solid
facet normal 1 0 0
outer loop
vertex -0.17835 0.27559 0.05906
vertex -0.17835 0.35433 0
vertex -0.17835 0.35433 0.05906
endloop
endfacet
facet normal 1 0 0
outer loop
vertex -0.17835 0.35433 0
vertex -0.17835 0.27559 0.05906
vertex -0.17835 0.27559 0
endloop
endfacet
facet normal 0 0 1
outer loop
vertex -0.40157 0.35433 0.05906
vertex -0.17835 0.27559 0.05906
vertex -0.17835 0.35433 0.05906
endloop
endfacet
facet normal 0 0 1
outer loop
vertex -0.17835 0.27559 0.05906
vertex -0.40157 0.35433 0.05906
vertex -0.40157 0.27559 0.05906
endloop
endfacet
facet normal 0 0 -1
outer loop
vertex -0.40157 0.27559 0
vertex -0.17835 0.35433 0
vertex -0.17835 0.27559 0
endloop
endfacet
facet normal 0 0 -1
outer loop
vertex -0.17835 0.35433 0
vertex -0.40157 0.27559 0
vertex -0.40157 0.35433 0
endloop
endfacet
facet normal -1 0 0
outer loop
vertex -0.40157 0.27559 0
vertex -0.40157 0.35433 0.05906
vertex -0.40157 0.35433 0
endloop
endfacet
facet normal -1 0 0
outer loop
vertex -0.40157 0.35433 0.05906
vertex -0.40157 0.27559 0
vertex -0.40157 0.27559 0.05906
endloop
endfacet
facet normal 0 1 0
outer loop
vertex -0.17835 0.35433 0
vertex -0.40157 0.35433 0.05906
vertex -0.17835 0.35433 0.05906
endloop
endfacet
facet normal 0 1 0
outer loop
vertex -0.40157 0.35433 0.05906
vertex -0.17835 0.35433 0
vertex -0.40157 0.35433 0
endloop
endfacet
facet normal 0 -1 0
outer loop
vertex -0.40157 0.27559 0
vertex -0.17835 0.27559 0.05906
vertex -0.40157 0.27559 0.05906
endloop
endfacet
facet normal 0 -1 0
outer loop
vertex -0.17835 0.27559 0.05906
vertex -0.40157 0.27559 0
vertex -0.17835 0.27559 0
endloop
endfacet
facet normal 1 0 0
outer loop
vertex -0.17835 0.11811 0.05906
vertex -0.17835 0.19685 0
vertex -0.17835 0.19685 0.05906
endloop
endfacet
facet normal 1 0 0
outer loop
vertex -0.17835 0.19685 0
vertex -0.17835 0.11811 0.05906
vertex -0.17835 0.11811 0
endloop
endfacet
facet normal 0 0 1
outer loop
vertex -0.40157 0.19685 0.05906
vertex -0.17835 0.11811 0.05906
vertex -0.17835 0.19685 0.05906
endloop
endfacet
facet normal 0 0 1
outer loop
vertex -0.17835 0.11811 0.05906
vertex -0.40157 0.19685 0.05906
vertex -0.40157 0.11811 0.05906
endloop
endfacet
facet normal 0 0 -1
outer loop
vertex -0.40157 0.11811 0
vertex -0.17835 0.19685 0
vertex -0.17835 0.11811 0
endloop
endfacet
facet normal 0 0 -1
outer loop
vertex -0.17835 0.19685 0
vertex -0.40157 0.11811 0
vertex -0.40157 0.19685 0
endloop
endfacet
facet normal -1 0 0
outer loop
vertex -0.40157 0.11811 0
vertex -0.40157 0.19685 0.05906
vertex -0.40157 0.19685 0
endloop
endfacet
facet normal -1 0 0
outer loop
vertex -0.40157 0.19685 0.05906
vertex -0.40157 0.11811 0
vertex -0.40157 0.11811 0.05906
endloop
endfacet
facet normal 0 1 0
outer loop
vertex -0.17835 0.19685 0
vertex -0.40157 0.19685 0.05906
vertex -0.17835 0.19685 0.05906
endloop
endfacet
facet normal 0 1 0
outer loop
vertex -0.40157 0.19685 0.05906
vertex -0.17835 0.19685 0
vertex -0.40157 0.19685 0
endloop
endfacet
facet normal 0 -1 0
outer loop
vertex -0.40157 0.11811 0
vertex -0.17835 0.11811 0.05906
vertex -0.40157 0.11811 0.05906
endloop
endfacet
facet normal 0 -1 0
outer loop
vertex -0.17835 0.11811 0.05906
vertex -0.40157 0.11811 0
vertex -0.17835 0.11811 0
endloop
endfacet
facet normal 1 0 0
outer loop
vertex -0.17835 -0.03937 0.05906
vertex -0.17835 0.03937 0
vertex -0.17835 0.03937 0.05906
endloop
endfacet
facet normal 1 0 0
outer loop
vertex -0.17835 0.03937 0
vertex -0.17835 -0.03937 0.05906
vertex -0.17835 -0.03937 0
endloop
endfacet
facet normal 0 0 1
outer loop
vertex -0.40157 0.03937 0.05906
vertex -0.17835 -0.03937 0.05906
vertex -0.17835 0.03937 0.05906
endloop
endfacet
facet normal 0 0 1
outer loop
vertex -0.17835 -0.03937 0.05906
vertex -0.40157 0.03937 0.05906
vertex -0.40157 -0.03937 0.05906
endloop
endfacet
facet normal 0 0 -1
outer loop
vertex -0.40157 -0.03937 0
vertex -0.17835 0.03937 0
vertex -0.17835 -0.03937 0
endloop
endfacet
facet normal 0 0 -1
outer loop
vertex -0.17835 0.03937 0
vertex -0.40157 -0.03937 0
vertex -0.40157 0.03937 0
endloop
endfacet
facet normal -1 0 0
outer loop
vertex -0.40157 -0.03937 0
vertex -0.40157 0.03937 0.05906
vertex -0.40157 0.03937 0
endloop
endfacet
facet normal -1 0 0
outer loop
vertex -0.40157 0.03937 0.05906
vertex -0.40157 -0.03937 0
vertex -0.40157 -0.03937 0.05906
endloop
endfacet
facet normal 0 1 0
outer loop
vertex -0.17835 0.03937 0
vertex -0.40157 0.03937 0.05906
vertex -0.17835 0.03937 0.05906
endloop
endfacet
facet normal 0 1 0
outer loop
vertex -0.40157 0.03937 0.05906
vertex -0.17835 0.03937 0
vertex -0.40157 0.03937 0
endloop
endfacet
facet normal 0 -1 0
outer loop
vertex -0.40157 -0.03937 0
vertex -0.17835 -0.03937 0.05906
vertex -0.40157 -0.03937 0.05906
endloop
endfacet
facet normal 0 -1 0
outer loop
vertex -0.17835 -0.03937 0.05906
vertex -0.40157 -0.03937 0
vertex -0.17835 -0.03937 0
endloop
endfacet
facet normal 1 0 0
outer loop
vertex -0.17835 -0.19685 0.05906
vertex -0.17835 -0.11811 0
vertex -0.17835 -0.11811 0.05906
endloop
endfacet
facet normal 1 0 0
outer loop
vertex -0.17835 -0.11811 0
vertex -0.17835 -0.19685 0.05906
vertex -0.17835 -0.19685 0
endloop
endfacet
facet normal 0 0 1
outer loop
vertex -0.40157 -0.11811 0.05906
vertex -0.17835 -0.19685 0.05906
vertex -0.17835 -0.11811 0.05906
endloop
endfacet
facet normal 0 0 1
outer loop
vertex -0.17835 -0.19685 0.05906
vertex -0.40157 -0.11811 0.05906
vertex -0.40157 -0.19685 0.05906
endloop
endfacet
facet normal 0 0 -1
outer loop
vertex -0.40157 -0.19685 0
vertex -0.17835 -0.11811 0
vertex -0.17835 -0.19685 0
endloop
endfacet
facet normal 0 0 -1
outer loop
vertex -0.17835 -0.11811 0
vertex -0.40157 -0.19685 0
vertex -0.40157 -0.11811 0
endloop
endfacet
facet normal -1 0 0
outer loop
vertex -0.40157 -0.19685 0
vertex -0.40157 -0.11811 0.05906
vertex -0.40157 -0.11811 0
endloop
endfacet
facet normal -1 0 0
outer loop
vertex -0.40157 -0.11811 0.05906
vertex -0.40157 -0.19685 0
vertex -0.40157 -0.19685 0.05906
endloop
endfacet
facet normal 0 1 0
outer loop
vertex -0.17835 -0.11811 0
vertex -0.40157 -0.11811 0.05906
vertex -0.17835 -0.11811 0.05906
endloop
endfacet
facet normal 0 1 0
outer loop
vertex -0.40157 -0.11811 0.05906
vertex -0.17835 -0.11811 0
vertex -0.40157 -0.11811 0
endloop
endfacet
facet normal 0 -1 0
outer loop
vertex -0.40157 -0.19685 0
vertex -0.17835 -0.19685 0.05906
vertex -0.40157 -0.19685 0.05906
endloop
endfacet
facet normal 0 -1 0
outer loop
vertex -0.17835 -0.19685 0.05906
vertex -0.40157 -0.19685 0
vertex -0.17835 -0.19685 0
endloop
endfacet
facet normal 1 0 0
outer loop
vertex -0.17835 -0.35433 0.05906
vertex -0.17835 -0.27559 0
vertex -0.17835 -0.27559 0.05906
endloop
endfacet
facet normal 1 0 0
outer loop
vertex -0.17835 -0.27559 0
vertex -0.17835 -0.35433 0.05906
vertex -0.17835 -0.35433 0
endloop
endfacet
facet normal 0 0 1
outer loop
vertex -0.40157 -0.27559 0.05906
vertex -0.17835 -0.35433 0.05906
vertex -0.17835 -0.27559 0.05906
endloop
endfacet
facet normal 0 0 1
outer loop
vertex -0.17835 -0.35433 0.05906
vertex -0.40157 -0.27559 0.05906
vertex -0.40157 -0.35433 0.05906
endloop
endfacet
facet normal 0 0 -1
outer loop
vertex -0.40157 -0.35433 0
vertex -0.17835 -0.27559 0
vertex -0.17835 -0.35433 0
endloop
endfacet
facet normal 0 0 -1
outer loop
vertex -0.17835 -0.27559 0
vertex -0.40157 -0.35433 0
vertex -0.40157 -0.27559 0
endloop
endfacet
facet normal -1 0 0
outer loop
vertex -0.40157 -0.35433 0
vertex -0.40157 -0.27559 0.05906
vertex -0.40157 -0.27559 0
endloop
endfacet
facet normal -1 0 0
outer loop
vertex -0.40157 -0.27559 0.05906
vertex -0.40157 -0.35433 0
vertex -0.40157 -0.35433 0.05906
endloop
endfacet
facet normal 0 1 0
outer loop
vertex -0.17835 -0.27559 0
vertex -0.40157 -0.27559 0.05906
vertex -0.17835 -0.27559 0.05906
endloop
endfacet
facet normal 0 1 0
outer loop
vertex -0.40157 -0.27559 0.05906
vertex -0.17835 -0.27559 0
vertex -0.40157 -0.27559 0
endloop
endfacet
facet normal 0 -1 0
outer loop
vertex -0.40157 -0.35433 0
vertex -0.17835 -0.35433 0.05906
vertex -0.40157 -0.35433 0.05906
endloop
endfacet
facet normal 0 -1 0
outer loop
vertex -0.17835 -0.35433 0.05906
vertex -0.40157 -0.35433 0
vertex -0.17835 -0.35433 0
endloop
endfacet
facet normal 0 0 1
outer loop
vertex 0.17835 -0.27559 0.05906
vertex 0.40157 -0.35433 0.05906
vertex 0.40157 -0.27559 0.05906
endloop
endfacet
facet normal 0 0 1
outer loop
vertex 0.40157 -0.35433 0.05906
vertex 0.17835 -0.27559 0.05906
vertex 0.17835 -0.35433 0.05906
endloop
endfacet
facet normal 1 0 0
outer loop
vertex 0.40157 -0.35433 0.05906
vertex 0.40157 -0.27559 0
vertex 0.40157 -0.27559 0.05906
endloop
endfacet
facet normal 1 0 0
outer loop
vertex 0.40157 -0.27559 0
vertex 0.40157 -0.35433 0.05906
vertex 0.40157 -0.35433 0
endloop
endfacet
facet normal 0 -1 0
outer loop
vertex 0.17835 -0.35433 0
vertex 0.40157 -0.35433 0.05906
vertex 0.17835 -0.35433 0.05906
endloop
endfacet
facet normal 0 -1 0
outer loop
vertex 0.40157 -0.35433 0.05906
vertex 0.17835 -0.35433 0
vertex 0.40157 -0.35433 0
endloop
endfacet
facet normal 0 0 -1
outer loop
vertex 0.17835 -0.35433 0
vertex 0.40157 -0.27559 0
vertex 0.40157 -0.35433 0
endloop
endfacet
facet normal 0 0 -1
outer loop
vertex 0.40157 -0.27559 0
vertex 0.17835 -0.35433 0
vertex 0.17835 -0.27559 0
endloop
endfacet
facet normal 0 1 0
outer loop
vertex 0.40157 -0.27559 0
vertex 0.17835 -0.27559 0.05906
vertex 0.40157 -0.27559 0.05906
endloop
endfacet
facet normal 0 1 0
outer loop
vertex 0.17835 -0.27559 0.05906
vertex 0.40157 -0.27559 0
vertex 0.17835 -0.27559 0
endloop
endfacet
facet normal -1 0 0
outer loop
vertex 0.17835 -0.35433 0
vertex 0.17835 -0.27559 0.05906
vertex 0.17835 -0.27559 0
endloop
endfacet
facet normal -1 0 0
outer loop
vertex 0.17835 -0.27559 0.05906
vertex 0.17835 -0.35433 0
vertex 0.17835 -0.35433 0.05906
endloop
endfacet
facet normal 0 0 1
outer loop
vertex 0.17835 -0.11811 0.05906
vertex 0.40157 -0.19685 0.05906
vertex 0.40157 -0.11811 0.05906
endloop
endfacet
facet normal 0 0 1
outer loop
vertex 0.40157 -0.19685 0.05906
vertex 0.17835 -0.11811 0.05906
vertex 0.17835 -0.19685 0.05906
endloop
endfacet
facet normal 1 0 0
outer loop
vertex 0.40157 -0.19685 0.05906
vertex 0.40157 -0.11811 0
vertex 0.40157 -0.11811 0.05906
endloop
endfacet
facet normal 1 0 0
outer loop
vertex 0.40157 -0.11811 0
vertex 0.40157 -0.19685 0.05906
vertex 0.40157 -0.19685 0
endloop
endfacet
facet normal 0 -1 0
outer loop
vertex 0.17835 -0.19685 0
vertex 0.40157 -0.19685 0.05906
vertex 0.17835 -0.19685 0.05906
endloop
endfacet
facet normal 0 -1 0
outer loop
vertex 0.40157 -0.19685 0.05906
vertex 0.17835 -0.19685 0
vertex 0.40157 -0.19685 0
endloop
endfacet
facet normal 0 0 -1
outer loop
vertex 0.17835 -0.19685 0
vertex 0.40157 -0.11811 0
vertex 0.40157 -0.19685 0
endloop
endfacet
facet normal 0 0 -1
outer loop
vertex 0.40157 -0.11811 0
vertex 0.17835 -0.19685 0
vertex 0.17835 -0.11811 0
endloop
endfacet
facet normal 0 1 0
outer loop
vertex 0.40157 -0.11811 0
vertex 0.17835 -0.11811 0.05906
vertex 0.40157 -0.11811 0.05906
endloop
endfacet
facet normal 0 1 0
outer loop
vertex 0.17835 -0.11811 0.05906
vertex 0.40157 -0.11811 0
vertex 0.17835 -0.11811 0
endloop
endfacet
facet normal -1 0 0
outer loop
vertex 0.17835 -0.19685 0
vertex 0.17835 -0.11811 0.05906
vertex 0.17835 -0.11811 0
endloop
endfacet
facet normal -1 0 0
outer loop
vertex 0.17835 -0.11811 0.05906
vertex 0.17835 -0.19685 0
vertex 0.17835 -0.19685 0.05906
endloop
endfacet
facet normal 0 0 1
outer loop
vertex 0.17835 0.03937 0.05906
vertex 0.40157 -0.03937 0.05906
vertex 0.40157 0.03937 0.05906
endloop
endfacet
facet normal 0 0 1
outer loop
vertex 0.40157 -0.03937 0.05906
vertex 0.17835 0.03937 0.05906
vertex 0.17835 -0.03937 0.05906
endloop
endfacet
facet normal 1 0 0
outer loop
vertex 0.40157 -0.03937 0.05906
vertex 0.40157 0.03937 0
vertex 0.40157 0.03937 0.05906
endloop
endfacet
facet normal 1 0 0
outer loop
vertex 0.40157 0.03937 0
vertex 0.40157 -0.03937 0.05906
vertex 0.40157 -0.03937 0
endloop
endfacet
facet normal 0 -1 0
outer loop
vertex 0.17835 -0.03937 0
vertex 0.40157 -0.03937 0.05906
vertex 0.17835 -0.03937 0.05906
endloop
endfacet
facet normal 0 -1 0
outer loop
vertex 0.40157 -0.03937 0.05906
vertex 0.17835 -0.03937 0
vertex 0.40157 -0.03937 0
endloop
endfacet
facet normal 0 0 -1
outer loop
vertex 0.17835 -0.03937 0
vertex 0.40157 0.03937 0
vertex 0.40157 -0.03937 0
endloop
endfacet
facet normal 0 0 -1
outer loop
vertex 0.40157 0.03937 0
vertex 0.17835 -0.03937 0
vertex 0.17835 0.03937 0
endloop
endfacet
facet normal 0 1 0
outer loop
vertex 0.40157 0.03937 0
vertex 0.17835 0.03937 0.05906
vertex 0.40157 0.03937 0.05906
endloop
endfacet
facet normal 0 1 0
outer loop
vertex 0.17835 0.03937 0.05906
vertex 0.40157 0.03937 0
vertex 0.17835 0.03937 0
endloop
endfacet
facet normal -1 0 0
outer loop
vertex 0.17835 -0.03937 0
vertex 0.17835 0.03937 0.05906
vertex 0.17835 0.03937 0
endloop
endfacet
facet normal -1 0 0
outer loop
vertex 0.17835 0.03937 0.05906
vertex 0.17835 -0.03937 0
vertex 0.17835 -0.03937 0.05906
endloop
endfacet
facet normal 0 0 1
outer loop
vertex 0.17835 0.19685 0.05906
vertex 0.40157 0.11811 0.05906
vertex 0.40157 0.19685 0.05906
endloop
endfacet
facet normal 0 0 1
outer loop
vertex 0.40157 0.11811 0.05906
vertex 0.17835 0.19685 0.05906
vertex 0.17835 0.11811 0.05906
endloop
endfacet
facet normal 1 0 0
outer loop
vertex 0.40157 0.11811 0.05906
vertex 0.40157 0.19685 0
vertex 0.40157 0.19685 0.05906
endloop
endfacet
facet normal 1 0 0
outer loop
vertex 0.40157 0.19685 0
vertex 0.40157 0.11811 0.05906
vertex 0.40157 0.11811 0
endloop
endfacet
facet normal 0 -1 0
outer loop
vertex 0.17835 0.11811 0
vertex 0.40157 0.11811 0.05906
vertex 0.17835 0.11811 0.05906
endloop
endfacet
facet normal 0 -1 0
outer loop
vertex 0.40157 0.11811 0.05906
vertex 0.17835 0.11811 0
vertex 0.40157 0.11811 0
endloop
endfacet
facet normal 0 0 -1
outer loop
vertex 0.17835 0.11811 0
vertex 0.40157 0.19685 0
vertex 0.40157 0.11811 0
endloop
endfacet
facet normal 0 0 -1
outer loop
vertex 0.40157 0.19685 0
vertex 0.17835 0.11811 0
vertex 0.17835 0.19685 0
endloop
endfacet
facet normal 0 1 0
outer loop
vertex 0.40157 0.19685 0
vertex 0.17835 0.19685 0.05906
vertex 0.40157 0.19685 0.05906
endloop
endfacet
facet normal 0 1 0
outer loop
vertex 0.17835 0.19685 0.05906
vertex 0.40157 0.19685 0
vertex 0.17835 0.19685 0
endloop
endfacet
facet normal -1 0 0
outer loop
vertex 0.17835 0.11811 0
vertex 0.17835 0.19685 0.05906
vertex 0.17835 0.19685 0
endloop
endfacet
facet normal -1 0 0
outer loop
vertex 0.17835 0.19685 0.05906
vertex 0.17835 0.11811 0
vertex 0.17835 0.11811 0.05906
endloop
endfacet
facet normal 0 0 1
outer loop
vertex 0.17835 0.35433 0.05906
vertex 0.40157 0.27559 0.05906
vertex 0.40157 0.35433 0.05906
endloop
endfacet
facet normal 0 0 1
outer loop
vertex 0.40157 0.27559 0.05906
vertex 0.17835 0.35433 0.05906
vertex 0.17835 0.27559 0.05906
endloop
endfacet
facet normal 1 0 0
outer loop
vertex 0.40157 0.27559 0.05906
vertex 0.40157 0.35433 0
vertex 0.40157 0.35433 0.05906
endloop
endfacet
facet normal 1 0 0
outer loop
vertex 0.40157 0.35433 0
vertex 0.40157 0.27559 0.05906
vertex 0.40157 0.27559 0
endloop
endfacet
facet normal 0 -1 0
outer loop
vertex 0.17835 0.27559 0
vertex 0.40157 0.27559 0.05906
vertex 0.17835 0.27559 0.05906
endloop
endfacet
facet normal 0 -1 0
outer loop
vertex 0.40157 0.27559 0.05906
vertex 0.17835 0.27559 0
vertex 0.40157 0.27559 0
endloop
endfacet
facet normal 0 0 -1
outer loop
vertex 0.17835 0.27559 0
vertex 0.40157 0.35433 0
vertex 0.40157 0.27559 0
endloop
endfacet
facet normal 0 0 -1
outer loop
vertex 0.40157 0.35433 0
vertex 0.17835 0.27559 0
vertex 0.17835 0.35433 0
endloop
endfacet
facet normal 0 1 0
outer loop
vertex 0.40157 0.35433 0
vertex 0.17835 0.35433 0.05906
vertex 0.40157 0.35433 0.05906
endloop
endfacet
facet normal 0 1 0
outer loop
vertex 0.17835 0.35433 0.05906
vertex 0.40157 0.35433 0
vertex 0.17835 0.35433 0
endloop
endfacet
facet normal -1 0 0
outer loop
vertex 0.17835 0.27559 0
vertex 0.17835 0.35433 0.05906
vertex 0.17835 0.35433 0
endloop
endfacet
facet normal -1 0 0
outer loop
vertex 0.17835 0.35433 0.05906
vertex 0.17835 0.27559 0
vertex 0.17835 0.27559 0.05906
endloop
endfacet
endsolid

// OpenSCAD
// file: defines.scad
L = 2.0;  // Длина
W = 2.0;  // Ширина
H = 1.0;  // Высота
Hf = 0.05;  // Возвышение над платой (высота выводов)
e = 0.4;    // Шаг выводов

pin_fragments = 16;

scale = 1/2.54;
// main file
include <defines.scad>

p_w = 0.567;
p_h = 0.2;

p_co = 1.0 - 0.667 + p_w/2;

module Pin(x, y, z, r) {
color("Gold")
  rotate([0,0,r]) translate([x-0.12,y,z+0.05])
  union() {
    /*Упрощенный вид ног*/
    cube(size = [p_w, p_h, Hf*3],center=true);
    /*Оригинальная форма*/
    /* translate([-0.04,0,0.0]) cube(size = [0.4, 0.3, Hf], center=true);
    translate([ 0.14,0,0.0]) cylinder(r = p_h/2, h = Hf, $fn = 64, center=true);
    translate([-0.23,0.1,0.0]) cylinder(r = 0.05, h = Hf, $fn = 64, center=true);
    translate([-0.23,-0.1,0.0]) cylinder(r = 0.05, h = Hf, $fn = 64, center=true);
    translate([-0.23,0,0]) cube(size = [0.1, 0.2, Hf],center=true); */

    /* translate([-0.39,0,0.15]) cube(size = [0.015, p_h, 0.1],center=true); // На боковине */
  }
}

scale(scale)
  translate([0,0,Hf/2])
  union() {
    Pin(-p_co, 0.8, 0, 0); // #1
    Pin(-p_co, 0.4, 0, 0); // #2
    Pin(-p_co, 0.0, 0, 0); // #3
    Pin(-p_co,-0.4, 0, 0); // #4
    Pin(-p_co,-0.8, 0, 0); // #5

    Pin(-p_co, 0.8, 0, 180); // #6
    Pin(-p_co, 0.4, 0, 180); // #7
    Pin(-p_co, 0.0, 0, 180); // #8
    Pin(-p_co,-0.4, 0, 180); // #9
    Pin(-p_co,-0.8, 0, 180); // #10

  };
